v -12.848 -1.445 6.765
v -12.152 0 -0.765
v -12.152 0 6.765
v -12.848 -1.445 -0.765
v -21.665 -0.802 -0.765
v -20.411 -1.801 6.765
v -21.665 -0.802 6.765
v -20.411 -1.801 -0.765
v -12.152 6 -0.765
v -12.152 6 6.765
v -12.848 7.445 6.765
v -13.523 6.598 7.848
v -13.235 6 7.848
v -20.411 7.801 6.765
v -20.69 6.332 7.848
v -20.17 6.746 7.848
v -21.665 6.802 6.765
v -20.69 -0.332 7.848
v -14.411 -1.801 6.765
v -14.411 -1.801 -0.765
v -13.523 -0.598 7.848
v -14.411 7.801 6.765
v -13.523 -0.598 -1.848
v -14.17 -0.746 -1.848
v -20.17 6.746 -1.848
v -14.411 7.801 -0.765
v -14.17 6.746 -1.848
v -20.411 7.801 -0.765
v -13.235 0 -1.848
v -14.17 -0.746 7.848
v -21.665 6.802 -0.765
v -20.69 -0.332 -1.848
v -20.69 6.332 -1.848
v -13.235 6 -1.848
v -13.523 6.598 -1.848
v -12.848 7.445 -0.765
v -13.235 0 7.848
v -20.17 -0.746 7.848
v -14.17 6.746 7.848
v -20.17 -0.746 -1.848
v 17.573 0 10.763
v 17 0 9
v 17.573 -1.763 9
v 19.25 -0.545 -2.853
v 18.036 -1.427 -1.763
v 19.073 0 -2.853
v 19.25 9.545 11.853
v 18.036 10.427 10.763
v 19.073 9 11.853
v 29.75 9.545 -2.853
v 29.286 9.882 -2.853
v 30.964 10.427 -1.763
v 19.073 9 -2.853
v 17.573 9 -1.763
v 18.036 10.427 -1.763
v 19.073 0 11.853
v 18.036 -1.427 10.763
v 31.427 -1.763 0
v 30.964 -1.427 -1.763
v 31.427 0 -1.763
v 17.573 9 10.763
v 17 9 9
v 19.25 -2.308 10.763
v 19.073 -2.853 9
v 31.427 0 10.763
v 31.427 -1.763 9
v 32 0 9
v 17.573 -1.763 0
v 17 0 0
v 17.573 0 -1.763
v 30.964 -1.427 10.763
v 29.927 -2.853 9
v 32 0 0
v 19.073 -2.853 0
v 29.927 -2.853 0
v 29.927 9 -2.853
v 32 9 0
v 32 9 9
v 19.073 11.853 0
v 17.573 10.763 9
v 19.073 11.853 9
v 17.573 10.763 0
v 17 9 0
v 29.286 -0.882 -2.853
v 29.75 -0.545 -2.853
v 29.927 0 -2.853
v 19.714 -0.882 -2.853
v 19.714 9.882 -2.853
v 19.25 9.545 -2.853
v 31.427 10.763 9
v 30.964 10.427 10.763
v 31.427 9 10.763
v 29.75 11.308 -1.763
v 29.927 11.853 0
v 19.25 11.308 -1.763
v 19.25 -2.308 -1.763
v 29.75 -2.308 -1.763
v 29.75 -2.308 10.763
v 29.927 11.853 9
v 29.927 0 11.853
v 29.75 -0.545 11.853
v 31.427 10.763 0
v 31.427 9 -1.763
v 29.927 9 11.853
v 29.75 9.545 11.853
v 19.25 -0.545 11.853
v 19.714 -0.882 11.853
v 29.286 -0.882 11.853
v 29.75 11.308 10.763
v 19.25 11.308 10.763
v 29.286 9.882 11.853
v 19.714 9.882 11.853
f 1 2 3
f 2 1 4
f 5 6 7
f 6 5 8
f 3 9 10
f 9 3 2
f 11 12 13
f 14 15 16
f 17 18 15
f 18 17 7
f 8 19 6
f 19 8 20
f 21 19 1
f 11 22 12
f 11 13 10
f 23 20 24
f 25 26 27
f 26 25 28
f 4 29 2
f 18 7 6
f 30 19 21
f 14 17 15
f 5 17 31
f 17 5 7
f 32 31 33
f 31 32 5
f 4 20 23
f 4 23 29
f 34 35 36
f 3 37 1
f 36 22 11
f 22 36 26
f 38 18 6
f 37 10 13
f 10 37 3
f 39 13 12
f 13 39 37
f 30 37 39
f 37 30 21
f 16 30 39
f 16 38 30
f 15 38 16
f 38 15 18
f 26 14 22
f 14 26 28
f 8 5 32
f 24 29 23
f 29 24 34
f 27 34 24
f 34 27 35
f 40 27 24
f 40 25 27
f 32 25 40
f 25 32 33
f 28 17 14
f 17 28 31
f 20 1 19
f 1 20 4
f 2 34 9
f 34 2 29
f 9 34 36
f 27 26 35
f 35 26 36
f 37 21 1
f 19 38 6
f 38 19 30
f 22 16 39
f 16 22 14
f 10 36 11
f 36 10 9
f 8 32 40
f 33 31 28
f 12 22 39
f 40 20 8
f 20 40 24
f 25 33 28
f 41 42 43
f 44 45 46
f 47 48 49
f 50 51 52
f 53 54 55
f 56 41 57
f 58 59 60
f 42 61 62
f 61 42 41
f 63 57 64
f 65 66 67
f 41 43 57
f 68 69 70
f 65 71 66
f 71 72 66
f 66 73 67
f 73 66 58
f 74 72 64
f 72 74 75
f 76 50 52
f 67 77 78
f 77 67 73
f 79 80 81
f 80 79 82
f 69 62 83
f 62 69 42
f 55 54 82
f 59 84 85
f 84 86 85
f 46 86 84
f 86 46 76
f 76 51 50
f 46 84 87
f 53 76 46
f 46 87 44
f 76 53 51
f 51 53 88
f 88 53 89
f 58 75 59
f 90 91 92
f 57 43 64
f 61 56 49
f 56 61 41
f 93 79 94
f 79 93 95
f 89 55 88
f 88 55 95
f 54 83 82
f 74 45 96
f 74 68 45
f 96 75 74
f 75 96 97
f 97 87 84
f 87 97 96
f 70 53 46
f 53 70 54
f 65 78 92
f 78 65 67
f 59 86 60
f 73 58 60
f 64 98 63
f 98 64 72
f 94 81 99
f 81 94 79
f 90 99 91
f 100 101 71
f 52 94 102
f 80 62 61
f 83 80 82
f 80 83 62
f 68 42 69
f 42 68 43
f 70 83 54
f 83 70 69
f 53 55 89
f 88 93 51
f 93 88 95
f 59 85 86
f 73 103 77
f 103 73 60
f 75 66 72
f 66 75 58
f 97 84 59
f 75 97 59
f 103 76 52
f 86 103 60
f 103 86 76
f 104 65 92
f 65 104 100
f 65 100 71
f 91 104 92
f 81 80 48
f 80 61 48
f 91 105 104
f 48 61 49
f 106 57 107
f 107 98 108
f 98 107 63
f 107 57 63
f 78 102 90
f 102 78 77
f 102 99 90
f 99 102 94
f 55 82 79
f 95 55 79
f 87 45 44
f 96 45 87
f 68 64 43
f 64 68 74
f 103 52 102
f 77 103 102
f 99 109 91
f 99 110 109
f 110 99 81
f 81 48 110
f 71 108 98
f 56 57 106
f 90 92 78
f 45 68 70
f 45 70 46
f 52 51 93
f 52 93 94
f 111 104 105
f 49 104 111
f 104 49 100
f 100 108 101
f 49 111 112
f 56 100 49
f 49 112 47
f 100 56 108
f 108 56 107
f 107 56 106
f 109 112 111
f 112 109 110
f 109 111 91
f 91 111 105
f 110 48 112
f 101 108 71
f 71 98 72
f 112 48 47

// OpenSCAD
// file: ../../lib/shapes/rounded_cube.scad
// lib/shapes/rounded_cube.scad

/**
 * Creates a rounded cube with the specified dimensions and radius.
 *
 * @param size Vector of 3 values for the x, y, and z dimensions of the cube.
 * @param radius The radius of the rounding.
 */
module shapeRoundedCube(size = [10, 10, 10], radius = 2) {
    minkowski() {
        cube(size - [radius*2, radius*2, radius*2]);
        sphere(radius);
    }
}
// main file
// tests/shapes/test_rounded_cube.scad

use <../../lib/shapes/rounded_cube.scad>

module testRoundedCube() {
    translate([-20, 0, 0])
    shapeRoundedCube(size = [10, 10, 10], radius = 2);

    translate([20, 0, 0])
    shapeRoundedCube(size = [15, 15, 15], radius = 3);
}

// Run tests
testRoundedCube();
